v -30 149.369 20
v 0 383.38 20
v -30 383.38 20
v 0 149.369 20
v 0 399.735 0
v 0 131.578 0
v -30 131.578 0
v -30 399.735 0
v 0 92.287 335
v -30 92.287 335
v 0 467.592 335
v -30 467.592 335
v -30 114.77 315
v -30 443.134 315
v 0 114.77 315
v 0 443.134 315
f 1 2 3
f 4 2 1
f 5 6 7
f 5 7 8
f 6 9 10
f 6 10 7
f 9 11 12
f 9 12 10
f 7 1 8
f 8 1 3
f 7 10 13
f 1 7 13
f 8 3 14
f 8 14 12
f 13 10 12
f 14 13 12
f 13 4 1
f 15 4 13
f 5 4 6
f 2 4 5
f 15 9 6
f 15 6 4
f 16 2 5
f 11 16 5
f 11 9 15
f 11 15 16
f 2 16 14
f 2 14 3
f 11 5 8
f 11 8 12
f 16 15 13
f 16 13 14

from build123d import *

# Parameters (mm, degrees)
F1_DEPTH = 30


with BuildPart() as f1:
    # F0 (on Right) → F1 (new body)
    with BuildSketch(Plane.YZ):
        Polygon((399.73456, 0), (467.591669, 334.999998), (92.28704, 334.999998), (131.5781, 0), align=None)
        Polygon((114.769867, 314.999998), (443.134323, 314.999998), (383.379555, 20), (149.369457, 20), align=None, mode=Mode.SUBTRACT)
    extrude(amount=-F1_DEPTH)


solid = f1.part
